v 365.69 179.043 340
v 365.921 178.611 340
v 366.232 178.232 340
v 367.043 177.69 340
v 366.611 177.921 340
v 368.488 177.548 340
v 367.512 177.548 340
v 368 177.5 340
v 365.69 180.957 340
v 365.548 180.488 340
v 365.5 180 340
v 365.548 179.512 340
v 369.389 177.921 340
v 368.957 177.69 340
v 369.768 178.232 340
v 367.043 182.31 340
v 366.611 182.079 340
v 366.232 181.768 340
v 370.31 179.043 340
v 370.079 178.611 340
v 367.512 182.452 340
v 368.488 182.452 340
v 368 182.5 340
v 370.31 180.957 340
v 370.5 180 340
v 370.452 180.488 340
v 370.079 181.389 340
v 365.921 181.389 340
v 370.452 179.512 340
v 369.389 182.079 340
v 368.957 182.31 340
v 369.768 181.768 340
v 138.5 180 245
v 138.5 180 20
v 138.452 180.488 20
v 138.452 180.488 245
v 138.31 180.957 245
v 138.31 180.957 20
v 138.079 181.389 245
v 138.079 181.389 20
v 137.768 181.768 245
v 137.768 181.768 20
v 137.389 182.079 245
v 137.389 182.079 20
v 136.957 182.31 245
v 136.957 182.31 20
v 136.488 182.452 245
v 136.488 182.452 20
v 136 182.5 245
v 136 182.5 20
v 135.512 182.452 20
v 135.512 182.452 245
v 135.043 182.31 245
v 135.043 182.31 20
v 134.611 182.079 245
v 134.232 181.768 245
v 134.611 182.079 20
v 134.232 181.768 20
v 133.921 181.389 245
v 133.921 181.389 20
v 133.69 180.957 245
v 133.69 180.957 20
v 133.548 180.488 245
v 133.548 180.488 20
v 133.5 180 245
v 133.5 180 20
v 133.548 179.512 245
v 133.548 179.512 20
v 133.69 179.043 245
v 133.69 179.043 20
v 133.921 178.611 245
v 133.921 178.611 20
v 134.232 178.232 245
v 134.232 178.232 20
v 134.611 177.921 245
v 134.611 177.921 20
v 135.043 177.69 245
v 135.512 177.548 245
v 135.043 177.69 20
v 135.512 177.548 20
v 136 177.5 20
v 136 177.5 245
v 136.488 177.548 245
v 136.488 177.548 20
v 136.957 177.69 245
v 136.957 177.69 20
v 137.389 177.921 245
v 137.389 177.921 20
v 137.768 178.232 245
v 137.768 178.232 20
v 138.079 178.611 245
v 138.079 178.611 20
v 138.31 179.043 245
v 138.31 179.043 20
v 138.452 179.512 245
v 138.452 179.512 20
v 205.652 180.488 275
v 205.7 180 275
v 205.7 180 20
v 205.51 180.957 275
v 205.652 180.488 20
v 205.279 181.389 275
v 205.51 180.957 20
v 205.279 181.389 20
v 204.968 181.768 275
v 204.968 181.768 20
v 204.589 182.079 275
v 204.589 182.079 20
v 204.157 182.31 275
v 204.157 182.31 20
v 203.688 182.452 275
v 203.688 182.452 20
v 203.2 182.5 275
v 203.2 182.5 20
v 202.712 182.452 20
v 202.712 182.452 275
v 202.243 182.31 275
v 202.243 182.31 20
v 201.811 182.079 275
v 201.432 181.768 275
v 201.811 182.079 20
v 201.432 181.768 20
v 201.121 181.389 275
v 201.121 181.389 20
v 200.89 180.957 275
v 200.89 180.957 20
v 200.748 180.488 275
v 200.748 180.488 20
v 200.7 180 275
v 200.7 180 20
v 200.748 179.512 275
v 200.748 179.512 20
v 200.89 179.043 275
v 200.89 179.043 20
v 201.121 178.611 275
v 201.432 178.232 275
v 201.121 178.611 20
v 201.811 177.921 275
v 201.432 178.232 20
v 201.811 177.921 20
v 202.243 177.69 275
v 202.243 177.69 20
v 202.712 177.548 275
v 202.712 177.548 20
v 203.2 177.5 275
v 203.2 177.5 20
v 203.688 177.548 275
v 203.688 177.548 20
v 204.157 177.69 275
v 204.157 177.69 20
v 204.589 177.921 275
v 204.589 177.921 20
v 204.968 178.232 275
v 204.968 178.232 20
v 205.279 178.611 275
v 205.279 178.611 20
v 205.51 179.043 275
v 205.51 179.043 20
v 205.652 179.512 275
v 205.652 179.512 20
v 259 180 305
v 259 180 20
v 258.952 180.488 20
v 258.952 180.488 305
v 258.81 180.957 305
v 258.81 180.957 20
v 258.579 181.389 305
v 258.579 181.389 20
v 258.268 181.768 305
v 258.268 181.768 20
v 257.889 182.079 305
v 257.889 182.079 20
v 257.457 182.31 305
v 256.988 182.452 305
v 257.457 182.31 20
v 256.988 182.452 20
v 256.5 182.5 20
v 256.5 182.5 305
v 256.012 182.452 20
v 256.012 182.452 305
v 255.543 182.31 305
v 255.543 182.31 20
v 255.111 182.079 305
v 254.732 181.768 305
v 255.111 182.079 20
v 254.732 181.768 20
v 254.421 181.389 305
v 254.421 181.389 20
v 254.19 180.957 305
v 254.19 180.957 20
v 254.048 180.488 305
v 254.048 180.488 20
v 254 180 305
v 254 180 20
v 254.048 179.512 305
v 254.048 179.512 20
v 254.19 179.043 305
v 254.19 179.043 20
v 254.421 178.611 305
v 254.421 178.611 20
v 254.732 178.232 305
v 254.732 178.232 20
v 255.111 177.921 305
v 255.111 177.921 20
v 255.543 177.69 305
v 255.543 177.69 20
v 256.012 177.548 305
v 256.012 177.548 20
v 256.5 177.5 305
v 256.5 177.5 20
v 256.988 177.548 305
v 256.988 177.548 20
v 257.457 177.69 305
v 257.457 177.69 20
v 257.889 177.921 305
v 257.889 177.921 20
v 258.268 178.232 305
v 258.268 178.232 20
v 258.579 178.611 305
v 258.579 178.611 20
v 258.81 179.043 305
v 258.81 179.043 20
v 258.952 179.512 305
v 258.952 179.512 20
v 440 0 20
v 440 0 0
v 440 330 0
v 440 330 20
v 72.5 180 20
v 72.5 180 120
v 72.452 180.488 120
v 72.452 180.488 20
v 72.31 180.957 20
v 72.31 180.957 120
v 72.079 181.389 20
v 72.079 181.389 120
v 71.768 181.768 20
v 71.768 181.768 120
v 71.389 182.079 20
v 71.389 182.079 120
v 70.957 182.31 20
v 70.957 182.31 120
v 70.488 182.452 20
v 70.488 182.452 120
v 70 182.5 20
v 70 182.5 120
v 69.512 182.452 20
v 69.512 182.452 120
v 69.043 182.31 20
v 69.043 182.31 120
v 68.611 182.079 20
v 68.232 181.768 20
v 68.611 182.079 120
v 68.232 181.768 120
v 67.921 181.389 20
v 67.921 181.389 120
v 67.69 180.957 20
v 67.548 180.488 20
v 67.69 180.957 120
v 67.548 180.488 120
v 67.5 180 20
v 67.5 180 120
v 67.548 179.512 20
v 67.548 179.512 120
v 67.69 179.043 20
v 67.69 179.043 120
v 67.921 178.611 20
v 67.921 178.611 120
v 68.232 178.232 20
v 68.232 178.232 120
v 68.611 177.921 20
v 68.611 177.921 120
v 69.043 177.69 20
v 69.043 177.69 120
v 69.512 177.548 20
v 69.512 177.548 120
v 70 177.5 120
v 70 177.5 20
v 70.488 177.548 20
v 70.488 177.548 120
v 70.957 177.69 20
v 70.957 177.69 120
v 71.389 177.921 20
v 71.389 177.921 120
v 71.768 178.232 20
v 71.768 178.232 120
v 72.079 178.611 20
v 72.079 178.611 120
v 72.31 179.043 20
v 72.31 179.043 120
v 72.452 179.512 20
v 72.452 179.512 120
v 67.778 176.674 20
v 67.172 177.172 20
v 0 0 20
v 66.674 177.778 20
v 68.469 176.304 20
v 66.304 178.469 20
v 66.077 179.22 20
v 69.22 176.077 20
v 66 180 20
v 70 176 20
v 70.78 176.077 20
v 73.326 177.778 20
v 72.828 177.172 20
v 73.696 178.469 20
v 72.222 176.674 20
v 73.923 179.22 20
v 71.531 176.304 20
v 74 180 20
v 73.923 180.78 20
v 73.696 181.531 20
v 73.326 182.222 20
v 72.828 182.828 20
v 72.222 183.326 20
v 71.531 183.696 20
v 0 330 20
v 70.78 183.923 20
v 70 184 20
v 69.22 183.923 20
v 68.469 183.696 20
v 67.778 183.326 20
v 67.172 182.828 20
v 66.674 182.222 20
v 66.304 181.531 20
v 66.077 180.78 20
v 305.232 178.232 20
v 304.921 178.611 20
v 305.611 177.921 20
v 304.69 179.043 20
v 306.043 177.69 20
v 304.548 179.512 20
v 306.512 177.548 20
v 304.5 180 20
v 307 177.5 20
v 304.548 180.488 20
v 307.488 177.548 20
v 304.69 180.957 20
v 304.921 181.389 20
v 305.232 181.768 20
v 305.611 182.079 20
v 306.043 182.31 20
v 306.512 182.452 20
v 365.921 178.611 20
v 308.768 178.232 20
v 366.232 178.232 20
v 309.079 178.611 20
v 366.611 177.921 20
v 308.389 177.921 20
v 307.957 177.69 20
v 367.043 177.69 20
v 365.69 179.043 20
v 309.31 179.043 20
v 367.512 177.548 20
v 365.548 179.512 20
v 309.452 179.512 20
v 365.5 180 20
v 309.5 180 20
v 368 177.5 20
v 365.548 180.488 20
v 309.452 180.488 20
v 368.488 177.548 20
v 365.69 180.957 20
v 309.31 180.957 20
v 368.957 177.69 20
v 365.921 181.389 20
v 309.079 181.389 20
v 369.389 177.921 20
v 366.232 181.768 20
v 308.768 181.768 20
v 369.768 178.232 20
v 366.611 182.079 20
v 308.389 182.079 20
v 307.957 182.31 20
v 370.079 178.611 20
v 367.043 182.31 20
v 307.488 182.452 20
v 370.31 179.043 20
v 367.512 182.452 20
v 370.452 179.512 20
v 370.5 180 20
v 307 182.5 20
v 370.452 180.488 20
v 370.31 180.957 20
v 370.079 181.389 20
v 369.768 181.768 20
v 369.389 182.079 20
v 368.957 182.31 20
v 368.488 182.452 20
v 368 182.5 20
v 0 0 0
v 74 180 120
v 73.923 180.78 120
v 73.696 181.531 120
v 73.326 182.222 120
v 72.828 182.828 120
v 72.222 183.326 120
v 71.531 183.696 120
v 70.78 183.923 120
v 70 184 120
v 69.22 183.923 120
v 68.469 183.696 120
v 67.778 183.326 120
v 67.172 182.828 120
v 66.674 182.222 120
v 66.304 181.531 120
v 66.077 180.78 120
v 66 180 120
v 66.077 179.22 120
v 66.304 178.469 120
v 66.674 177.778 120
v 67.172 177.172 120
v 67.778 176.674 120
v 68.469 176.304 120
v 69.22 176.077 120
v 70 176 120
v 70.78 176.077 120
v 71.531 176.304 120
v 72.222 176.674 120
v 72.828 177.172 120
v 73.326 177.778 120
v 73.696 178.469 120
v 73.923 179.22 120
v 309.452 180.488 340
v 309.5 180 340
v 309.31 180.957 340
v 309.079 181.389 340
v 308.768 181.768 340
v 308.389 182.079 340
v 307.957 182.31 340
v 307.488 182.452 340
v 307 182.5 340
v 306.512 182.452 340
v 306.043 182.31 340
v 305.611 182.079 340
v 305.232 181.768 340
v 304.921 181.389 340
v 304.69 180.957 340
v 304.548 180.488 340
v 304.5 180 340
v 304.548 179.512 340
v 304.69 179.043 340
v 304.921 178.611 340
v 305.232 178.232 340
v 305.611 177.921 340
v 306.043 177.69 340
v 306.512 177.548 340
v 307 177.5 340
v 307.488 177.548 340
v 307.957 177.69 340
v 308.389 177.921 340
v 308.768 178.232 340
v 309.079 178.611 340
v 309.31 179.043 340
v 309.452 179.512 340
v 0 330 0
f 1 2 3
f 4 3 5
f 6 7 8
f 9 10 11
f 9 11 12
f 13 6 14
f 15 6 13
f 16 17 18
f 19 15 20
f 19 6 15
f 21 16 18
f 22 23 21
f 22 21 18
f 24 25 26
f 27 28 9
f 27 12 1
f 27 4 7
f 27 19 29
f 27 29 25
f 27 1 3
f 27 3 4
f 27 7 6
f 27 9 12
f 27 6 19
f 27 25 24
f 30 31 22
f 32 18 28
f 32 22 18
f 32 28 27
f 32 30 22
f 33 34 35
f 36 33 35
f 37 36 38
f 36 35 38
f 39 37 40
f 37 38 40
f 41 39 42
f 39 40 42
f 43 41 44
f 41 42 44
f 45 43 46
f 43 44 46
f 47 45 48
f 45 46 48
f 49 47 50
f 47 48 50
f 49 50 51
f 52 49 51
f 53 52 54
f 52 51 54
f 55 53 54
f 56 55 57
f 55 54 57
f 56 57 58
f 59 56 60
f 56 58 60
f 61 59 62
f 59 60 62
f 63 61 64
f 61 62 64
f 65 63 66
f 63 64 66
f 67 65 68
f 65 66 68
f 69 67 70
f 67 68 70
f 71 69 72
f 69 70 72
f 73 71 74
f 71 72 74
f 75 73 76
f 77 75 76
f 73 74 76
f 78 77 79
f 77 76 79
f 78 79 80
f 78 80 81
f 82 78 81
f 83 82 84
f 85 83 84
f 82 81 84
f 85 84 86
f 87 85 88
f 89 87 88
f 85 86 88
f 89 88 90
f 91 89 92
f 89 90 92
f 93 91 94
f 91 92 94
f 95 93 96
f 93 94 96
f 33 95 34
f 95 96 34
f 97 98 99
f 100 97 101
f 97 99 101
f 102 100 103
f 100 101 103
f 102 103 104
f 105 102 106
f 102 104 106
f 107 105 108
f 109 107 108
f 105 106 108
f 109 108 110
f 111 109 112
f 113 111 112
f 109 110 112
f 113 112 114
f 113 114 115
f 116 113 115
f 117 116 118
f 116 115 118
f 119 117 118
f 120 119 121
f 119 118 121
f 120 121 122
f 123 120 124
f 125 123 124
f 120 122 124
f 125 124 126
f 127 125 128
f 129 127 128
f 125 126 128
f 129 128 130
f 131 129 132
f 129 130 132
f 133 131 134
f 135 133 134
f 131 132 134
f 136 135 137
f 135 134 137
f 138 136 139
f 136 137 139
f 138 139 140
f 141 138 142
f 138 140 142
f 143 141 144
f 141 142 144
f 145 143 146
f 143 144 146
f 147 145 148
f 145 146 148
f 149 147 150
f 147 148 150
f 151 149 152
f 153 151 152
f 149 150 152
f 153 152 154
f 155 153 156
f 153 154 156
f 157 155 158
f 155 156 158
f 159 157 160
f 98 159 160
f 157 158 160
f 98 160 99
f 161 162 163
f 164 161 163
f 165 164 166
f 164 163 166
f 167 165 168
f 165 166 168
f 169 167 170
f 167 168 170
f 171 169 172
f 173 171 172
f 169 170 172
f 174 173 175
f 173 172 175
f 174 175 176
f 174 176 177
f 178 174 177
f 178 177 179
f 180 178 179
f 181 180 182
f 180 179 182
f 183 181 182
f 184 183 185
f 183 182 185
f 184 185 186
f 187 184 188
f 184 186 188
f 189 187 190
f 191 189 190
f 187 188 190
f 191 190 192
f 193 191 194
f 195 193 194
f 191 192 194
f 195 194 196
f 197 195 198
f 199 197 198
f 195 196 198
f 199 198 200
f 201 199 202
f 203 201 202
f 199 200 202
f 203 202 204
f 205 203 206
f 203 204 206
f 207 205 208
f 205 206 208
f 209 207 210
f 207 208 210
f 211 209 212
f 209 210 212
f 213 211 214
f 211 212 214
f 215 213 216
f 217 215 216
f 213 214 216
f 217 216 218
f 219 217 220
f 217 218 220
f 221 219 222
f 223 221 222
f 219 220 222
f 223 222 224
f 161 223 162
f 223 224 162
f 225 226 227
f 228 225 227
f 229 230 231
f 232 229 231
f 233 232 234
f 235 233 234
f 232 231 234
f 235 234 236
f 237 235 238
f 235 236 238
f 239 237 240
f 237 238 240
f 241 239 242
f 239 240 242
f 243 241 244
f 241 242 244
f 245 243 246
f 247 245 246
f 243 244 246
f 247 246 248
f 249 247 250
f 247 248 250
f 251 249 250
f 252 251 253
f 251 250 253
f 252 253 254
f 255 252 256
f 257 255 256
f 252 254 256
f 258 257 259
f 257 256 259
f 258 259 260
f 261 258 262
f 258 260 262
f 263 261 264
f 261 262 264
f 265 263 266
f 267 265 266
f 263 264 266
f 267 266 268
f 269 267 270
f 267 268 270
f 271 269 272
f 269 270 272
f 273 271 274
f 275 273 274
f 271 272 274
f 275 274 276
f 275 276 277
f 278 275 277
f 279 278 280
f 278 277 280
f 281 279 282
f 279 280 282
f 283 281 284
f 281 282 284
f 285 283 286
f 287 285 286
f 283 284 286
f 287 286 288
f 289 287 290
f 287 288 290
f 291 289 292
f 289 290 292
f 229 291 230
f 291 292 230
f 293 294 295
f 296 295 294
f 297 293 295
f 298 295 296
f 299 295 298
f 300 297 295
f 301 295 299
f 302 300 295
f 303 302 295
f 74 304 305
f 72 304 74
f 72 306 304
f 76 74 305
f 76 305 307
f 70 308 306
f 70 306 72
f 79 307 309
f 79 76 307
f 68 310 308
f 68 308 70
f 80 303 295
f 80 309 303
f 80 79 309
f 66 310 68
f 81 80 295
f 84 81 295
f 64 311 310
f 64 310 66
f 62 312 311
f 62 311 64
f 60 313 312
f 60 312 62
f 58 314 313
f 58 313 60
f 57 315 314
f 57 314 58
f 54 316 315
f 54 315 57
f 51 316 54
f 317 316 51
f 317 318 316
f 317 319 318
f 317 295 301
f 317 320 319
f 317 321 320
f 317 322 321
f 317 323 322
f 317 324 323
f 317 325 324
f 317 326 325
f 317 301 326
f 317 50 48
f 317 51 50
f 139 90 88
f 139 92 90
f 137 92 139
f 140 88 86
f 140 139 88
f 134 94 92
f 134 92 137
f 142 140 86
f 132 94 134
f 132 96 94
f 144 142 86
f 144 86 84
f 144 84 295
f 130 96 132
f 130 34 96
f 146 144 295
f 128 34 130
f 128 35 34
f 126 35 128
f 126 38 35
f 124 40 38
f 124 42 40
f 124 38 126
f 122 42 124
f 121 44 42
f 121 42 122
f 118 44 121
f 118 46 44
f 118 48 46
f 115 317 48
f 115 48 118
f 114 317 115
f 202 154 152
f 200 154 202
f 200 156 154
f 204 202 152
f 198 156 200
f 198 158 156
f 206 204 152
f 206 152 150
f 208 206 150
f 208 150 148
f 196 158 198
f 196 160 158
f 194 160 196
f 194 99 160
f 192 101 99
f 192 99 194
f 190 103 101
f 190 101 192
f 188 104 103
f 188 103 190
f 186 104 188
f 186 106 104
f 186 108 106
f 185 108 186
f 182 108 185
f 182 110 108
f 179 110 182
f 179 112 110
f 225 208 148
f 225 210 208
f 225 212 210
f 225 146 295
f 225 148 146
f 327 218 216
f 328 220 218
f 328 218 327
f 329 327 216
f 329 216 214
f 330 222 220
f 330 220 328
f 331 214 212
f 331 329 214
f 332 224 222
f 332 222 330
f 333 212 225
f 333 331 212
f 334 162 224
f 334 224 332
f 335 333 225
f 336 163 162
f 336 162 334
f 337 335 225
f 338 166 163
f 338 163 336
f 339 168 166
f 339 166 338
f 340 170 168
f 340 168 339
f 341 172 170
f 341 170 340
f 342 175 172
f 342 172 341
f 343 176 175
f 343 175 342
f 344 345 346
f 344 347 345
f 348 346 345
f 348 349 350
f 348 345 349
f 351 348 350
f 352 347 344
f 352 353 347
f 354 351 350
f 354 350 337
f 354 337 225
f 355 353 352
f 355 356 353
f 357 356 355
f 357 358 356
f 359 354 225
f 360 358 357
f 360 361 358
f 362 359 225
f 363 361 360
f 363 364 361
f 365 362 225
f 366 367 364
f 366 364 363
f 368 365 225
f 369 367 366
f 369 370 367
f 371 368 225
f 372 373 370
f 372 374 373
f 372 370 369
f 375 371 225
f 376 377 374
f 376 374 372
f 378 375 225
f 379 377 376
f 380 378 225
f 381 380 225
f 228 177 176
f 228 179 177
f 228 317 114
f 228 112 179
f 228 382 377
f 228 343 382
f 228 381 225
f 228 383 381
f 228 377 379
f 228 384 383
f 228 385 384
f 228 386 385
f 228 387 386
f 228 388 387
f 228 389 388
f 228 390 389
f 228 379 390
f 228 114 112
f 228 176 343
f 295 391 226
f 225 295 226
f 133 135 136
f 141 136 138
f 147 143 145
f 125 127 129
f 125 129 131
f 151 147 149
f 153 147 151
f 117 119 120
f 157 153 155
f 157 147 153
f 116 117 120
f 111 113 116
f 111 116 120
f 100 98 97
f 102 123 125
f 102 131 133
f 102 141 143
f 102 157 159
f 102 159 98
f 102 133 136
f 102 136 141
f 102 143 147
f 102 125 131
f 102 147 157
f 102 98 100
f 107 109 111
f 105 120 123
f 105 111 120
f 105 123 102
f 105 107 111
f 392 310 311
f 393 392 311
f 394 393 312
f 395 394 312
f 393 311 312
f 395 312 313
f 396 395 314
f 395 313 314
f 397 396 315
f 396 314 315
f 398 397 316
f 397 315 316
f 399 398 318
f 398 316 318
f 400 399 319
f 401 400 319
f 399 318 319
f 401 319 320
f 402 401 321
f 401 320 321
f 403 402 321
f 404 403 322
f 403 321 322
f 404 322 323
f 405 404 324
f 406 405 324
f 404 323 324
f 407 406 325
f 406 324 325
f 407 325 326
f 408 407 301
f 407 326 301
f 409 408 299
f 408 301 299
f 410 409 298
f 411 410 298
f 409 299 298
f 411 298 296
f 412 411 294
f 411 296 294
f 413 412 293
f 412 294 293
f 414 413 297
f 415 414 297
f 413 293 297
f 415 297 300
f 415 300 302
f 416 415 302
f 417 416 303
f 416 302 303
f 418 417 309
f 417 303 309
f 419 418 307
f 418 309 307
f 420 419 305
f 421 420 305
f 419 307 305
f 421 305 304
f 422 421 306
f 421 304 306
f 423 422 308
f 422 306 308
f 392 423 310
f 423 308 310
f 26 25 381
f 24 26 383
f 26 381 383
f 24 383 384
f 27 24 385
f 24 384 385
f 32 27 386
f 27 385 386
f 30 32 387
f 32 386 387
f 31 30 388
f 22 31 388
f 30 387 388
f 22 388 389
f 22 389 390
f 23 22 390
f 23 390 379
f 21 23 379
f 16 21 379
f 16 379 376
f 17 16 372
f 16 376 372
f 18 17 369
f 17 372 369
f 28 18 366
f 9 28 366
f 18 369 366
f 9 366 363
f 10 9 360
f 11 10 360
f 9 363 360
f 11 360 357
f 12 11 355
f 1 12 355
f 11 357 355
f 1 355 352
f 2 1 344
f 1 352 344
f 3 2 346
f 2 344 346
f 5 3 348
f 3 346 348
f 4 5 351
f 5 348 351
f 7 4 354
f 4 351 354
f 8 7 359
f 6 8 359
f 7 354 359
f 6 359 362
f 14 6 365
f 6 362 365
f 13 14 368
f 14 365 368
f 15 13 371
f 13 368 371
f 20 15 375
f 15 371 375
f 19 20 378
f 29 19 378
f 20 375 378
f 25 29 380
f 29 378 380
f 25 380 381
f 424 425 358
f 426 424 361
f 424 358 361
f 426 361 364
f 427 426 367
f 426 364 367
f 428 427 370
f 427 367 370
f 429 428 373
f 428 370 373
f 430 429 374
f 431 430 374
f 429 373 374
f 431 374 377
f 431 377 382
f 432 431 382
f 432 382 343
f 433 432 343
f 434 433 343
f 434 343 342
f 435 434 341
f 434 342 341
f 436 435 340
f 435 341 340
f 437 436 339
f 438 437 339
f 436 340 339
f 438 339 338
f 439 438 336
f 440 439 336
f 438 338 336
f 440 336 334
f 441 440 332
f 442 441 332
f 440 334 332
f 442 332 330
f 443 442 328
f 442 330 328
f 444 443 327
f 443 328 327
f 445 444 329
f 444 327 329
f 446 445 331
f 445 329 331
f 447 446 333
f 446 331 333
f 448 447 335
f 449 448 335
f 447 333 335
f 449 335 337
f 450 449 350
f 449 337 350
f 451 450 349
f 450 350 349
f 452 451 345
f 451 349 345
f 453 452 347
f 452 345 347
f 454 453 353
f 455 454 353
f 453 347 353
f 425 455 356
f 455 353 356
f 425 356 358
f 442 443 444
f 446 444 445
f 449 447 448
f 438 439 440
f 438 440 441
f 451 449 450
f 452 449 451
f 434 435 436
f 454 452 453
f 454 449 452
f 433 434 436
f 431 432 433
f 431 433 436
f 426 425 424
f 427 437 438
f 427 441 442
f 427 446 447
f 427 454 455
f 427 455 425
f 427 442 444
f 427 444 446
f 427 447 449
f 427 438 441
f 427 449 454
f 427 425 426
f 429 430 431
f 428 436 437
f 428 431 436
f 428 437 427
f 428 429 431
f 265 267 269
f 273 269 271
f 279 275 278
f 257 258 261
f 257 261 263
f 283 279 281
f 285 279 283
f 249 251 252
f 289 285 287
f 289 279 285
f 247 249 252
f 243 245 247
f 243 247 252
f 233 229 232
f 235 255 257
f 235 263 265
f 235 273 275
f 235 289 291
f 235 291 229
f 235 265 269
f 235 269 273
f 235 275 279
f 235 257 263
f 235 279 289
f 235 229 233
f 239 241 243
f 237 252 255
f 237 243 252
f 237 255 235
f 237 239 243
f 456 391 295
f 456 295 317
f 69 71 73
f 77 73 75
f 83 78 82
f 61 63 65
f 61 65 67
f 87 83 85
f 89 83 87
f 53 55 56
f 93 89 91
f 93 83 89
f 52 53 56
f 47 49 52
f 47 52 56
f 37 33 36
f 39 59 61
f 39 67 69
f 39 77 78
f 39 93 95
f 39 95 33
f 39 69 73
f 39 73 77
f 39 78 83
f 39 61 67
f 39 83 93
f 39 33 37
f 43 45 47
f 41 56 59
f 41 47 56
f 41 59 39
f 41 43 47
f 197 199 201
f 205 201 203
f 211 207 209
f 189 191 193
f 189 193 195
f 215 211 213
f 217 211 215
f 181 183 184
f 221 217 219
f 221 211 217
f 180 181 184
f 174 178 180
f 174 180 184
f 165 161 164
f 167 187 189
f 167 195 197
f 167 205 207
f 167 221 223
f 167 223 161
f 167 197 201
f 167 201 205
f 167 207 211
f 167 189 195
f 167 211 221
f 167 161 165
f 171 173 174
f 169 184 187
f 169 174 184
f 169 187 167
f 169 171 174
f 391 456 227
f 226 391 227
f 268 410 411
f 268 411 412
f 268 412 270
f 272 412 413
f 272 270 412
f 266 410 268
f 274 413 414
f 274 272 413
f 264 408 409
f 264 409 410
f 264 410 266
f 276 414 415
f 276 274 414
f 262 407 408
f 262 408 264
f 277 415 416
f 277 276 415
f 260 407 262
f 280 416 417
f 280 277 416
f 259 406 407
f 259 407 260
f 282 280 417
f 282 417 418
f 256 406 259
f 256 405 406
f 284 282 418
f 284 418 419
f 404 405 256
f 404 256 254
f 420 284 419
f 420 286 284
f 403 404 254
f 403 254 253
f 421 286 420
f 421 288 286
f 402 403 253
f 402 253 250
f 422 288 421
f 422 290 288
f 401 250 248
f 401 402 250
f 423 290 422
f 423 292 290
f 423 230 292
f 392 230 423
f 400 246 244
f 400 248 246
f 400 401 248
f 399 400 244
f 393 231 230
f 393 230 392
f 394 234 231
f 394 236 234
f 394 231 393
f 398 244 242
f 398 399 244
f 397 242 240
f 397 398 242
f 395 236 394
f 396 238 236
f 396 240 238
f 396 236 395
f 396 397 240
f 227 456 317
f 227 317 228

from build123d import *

# Parameters (mm, degrees)
CROQUIS1_W              = 440
CROQUIS1_H              = 330
SALIENTE_EXTRUIR1_DEPTH = 20
CROQUIS3_R              = 4
SALIENTE_EXTRUIR2_DEPTH = 100
CROQUIS5_R              = 2.5
CORTAR_EXTRUIR2_DEPTH   = 100
CROQUIS3_3_R            = 2.5
SALIENTE_EXTRUIR3_DEPTH = 225
CROQUIS3_4_R            = 2.5
SALIENTE_EXTRUIR4_DEPTH = 255
CROQUIS3_5_R            = 2.5
SALIENTE_EXTRUIR5_DEPTH = 255
CROQUIS3_6_R            = 2.5
SALIENTE_EXTRUIR6_DEPTH = 285
CROQUIS3_7_R            = 2.5
SALIENTE_EXTRUIR7_DEPTH = 320


with BuildPart() as part:
    # Croquis1 → Saliente-Extruir1 (new body)
    with BuildSketch(Plane.XY):
        with Locations((220, 165)):
            Rectangle(CROQUIS1_W, CROQUIS1_H)
    extrude(amount=SALIENTE_EXTRUIR1_DEPTH)

    # Croquis3 → Saliente-Extruir2 (add)
    with BuildSketch(Plane.XY.offset(20)):
        with Locations((70, 180)):
            Circle(CROQUIS3_R)
    extrude(amount=SALIENTE_EXTRUIR2_DEPTH)

    # Croquis5 → Cortar-Extruir2 (cut)
    with BuildSketch(Plane.XY.offset(120)):
        with Locations((70, 180)):
            Circle(CROQUIS5_R)
    extrude(amount=-CORTAR_EXTRUIR2_DEPTH, mode=Mode.SUBTRACT)

    # Croquis3<3> → Saliente-Extruir3 (add)
    with BuildSketch(Plane.XY.offset(20)):
        with Locations((136, 180)):
            Circle(CROQUIS3_3_R)
    extrude(amount=SALIENTE_EXTRUIR3_DEPTH)

    # Croquis3<4> → Saliente-Extruir4 (add)
    with BuildSketch(Plane.XY.offset(20)):
        with Locations((203.2, 180)):
            Circle(CROQUIS3_4_R)
    extrude(amount=SALIENTE_EXTRUIR4_DEPTH)

    # Croquis3<5> → Saliente-Extruir5 (add)
    with BuildSketch(Plane.XY.offset(20)):
        with Locations((203.2, 180)):
            Circle(CROQUIS3_5_R)
    extrude(amount=SALIENTE_EXTRUIR5_DEPTH)

    # Croquis3<6> → Saliente-Extruir6 (add)
    with BuildSketch(Plane.XY.offset(20)):
        with Locations((256.5, 180)):
            Circle(CROQUIS3_6_R)
    extrude(amount=SALIENTE_EXTRUIR6_DEPTH)

    # Croquis3<7> → Saliente-Extruir7 (add)
    with BuildSketch(Plane.XY.offset(20)):
        with Locations((307, 180)):
            Circle(CROQUIS3_7_R)
        with Locations((368, 180)):
            Circle(CROQUIS3_7_R)
    extrude(amount=SALIENTE_EXTRUIR7_DEPTH)


solid = part.part
